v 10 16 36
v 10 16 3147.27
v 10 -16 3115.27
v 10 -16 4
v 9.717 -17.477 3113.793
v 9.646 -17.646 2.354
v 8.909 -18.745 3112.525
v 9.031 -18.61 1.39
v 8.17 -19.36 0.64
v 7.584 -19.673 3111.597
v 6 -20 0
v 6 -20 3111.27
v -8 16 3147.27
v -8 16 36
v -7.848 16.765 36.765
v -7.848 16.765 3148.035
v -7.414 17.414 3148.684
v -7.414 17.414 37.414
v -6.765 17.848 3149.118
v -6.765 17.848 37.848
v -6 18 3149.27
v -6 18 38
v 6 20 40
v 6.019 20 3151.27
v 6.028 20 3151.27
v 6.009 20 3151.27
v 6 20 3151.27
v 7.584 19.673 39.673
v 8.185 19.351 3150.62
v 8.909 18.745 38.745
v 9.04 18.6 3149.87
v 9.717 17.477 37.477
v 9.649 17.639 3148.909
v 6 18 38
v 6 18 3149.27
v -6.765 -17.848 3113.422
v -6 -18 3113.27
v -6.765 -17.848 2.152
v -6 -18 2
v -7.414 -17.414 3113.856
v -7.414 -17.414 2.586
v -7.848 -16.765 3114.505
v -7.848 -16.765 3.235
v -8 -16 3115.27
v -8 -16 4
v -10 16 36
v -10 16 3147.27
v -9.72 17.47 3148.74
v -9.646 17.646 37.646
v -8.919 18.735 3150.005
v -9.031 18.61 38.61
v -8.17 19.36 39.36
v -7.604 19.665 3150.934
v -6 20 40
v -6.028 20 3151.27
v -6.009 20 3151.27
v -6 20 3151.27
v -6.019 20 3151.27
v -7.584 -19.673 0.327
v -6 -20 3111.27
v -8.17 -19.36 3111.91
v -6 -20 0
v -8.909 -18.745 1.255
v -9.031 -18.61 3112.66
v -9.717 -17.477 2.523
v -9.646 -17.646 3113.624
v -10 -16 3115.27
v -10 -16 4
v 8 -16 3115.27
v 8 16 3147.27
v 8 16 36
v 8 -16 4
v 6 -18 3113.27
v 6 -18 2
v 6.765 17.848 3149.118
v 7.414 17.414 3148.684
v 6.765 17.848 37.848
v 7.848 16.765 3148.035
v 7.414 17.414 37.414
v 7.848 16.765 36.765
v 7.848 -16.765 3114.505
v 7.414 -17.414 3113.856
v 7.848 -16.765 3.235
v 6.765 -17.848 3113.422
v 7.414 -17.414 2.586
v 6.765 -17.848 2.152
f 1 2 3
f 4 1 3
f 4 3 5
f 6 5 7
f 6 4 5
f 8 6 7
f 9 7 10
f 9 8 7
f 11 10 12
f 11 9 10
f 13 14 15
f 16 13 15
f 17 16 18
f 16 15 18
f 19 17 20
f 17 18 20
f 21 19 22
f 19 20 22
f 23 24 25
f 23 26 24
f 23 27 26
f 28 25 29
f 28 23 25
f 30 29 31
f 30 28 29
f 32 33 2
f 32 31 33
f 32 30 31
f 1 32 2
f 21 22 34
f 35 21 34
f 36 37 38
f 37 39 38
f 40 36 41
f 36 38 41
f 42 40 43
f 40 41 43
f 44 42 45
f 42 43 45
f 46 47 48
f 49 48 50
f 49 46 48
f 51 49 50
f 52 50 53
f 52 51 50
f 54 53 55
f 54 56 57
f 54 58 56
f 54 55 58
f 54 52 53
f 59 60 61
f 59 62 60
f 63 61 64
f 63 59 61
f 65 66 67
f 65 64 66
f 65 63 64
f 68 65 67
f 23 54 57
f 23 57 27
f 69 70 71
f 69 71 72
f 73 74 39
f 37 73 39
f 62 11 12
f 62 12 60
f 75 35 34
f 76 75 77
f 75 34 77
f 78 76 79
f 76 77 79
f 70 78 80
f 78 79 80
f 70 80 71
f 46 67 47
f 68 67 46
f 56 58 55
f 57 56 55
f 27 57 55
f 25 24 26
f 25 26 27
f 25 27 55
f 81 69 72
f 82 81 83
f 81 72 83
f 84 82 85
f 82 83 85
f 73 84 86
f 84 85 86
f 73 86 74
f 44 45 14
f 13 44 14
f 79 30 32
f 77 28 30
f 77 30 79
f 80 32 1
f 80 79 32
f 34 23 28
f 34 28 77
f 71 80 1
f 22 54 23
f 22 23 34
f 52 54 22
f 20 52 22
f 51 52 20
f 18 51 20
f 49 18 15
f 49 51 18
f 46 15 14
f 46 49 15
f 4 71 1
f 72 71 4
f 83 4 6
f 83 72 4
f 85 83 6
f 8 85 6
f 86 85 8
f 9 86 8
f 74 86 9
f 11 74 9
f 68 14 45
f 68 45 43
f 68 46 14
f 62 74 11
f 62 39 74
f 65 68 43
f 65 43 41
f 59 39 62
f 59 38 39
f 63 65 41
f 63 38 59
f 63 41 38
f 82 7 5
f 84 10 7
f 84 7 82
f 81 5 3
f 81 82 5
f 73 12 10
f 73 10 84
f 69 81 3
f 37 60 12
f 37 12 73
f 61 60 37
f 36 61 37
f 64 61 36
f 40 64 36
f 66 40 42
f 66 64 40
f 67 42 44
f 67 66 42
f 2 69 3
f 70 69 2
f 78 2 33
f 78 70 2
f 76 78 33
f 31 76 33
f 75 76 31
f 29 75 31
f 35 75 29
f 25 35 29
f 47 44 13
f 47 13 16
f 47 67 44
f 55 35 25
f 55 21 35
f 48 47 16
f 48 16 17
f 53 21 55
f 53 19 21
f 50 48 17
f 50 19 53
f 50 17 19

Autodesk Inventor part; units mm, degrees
ref_plane "Start Plane" through (0, 0, 0) normal (0, 0, 1) x (1, 0, 0)
ref_plane "End Plane" through (0, 0, 3151.2698) normal (0, 0, 1) x (1, 0, 0)
sketch "Sketch" plane through (0, 0, 0) normal (0, 0, 1) x (1, 0, 0)
  line L0 (-10, -16) -> (-10, 16)
  line L1 (-6, 20) -> (6, 20)
  line L2 (10, 16) -> (10, -16)
  line L3 (6, -20) -> (-6, -20)
  arc A0 (-10, -16) -> (-6, -20) centre (-6, -16) ccw
  arc A1 (10, 16) -> (6, 20) centre (6, 16) ccw
  arc A2 (-6, 20) -> (-10, 16) centre (-6, 16) ccw
  arc A3 (6, -20) -> (10, -16) centre (6, -16) ccw
  arc A4 (-6, 18) -> (-8, 16) centre (-6, 16) ccw
  line L4 (-6, 18) -> (6, 18)
  arc A5 (8, 16) -> (6, 18) centre (6, 16) ccw
  line L5 (8, 16) -> (8, -16)
  arc A6 (6, -18) -> (8, -16) centre (6, -16) ccw
  line L6 (6, -18) -> (-6, -18)
  arc A7 (-8, -16) -> (-6, -18) centre (-6, -16) ccw
  line L7 (-8, -16) -> (-8, 16)
  line L8 (0, 29.1598) -> (0, -29.1598) construction
  line L9 (-15.1598, 0) -> (15.1598, 0) construction
  dimension "d7" = 4
  dimension "d9" = 20
  dimension "d11" = 40
  dimension "d12" = 2
  dimension "d15" = 10
  dimension "d16" = 20
extrude "Body" add sketch "Sketch" along normal up to surface (3151.2698 mm away) from surface at 0
sketch "Sketch3" plane through (0, 0, 0) normal (0, 0, 1) x (1, 0, 0)
  line L0 (0, 0) -> (10, 0)
ref_plane "Work Plane3" through (0, 0, 0) normal (0, -1, 0) x (1, 0, 0)
ref_plane "Work Plane4" through (4, -1717.0563, 1414.2136) normal (0, -0.7071, 0.7071) x (1, 0, 0)
split "Split1" plane through (4, -1717.0563, 1414.2136) removes the side toward (0, -0.7071, 0.7071)
ref_plane "Work Plane5" through (44, 1677.0563, 1697.0563) normal (0, 0.7071, -0.7071) x (1, 0, 0)
split "Split2" plane through (44, 1677.0563, 1697.0563) removes the side toward (0, 0.7071, -0.7071)
sketch "Sketch4" plane through (0, 0, 0) normal (0, -1, 0) x (1, 0, 0)
  line L0 (-2, 0) -> (12, 0) projected
  line L1 (-2, 3151.2698) -> (12, 3151.2698) projected
  dimension "d18" = 3151.2698
equation "\"d7\" = G_IR"
equation "\"d9\" = G_W"
equation "\"d11\" = G_H"
equation "\"d12\" = G_T"
equation "\"d15\" = 0.5 * d9"
equation "\"d16\" = 0.5 * d11"
equation "\"d3\" = G_L"
equation "\"G_W\" = 20"
equation "\"G_H\" = 40"
equation "\"G_T\" = 2"
equation "\"G_IR\" = 4"
equation "\"G_L\" = d18"
equation "\"G_OFFSET_START\" = 0"
equation "\"d14\" = G_OFFSET_END + B_L"
equation "\"B_L\" = 3111.26984"
equation "\"G_OFFSET_END\" = 40"
properties part number "ISO 10799-2 - 40x20x2 - 3151,27" material "Steel, Mild"
